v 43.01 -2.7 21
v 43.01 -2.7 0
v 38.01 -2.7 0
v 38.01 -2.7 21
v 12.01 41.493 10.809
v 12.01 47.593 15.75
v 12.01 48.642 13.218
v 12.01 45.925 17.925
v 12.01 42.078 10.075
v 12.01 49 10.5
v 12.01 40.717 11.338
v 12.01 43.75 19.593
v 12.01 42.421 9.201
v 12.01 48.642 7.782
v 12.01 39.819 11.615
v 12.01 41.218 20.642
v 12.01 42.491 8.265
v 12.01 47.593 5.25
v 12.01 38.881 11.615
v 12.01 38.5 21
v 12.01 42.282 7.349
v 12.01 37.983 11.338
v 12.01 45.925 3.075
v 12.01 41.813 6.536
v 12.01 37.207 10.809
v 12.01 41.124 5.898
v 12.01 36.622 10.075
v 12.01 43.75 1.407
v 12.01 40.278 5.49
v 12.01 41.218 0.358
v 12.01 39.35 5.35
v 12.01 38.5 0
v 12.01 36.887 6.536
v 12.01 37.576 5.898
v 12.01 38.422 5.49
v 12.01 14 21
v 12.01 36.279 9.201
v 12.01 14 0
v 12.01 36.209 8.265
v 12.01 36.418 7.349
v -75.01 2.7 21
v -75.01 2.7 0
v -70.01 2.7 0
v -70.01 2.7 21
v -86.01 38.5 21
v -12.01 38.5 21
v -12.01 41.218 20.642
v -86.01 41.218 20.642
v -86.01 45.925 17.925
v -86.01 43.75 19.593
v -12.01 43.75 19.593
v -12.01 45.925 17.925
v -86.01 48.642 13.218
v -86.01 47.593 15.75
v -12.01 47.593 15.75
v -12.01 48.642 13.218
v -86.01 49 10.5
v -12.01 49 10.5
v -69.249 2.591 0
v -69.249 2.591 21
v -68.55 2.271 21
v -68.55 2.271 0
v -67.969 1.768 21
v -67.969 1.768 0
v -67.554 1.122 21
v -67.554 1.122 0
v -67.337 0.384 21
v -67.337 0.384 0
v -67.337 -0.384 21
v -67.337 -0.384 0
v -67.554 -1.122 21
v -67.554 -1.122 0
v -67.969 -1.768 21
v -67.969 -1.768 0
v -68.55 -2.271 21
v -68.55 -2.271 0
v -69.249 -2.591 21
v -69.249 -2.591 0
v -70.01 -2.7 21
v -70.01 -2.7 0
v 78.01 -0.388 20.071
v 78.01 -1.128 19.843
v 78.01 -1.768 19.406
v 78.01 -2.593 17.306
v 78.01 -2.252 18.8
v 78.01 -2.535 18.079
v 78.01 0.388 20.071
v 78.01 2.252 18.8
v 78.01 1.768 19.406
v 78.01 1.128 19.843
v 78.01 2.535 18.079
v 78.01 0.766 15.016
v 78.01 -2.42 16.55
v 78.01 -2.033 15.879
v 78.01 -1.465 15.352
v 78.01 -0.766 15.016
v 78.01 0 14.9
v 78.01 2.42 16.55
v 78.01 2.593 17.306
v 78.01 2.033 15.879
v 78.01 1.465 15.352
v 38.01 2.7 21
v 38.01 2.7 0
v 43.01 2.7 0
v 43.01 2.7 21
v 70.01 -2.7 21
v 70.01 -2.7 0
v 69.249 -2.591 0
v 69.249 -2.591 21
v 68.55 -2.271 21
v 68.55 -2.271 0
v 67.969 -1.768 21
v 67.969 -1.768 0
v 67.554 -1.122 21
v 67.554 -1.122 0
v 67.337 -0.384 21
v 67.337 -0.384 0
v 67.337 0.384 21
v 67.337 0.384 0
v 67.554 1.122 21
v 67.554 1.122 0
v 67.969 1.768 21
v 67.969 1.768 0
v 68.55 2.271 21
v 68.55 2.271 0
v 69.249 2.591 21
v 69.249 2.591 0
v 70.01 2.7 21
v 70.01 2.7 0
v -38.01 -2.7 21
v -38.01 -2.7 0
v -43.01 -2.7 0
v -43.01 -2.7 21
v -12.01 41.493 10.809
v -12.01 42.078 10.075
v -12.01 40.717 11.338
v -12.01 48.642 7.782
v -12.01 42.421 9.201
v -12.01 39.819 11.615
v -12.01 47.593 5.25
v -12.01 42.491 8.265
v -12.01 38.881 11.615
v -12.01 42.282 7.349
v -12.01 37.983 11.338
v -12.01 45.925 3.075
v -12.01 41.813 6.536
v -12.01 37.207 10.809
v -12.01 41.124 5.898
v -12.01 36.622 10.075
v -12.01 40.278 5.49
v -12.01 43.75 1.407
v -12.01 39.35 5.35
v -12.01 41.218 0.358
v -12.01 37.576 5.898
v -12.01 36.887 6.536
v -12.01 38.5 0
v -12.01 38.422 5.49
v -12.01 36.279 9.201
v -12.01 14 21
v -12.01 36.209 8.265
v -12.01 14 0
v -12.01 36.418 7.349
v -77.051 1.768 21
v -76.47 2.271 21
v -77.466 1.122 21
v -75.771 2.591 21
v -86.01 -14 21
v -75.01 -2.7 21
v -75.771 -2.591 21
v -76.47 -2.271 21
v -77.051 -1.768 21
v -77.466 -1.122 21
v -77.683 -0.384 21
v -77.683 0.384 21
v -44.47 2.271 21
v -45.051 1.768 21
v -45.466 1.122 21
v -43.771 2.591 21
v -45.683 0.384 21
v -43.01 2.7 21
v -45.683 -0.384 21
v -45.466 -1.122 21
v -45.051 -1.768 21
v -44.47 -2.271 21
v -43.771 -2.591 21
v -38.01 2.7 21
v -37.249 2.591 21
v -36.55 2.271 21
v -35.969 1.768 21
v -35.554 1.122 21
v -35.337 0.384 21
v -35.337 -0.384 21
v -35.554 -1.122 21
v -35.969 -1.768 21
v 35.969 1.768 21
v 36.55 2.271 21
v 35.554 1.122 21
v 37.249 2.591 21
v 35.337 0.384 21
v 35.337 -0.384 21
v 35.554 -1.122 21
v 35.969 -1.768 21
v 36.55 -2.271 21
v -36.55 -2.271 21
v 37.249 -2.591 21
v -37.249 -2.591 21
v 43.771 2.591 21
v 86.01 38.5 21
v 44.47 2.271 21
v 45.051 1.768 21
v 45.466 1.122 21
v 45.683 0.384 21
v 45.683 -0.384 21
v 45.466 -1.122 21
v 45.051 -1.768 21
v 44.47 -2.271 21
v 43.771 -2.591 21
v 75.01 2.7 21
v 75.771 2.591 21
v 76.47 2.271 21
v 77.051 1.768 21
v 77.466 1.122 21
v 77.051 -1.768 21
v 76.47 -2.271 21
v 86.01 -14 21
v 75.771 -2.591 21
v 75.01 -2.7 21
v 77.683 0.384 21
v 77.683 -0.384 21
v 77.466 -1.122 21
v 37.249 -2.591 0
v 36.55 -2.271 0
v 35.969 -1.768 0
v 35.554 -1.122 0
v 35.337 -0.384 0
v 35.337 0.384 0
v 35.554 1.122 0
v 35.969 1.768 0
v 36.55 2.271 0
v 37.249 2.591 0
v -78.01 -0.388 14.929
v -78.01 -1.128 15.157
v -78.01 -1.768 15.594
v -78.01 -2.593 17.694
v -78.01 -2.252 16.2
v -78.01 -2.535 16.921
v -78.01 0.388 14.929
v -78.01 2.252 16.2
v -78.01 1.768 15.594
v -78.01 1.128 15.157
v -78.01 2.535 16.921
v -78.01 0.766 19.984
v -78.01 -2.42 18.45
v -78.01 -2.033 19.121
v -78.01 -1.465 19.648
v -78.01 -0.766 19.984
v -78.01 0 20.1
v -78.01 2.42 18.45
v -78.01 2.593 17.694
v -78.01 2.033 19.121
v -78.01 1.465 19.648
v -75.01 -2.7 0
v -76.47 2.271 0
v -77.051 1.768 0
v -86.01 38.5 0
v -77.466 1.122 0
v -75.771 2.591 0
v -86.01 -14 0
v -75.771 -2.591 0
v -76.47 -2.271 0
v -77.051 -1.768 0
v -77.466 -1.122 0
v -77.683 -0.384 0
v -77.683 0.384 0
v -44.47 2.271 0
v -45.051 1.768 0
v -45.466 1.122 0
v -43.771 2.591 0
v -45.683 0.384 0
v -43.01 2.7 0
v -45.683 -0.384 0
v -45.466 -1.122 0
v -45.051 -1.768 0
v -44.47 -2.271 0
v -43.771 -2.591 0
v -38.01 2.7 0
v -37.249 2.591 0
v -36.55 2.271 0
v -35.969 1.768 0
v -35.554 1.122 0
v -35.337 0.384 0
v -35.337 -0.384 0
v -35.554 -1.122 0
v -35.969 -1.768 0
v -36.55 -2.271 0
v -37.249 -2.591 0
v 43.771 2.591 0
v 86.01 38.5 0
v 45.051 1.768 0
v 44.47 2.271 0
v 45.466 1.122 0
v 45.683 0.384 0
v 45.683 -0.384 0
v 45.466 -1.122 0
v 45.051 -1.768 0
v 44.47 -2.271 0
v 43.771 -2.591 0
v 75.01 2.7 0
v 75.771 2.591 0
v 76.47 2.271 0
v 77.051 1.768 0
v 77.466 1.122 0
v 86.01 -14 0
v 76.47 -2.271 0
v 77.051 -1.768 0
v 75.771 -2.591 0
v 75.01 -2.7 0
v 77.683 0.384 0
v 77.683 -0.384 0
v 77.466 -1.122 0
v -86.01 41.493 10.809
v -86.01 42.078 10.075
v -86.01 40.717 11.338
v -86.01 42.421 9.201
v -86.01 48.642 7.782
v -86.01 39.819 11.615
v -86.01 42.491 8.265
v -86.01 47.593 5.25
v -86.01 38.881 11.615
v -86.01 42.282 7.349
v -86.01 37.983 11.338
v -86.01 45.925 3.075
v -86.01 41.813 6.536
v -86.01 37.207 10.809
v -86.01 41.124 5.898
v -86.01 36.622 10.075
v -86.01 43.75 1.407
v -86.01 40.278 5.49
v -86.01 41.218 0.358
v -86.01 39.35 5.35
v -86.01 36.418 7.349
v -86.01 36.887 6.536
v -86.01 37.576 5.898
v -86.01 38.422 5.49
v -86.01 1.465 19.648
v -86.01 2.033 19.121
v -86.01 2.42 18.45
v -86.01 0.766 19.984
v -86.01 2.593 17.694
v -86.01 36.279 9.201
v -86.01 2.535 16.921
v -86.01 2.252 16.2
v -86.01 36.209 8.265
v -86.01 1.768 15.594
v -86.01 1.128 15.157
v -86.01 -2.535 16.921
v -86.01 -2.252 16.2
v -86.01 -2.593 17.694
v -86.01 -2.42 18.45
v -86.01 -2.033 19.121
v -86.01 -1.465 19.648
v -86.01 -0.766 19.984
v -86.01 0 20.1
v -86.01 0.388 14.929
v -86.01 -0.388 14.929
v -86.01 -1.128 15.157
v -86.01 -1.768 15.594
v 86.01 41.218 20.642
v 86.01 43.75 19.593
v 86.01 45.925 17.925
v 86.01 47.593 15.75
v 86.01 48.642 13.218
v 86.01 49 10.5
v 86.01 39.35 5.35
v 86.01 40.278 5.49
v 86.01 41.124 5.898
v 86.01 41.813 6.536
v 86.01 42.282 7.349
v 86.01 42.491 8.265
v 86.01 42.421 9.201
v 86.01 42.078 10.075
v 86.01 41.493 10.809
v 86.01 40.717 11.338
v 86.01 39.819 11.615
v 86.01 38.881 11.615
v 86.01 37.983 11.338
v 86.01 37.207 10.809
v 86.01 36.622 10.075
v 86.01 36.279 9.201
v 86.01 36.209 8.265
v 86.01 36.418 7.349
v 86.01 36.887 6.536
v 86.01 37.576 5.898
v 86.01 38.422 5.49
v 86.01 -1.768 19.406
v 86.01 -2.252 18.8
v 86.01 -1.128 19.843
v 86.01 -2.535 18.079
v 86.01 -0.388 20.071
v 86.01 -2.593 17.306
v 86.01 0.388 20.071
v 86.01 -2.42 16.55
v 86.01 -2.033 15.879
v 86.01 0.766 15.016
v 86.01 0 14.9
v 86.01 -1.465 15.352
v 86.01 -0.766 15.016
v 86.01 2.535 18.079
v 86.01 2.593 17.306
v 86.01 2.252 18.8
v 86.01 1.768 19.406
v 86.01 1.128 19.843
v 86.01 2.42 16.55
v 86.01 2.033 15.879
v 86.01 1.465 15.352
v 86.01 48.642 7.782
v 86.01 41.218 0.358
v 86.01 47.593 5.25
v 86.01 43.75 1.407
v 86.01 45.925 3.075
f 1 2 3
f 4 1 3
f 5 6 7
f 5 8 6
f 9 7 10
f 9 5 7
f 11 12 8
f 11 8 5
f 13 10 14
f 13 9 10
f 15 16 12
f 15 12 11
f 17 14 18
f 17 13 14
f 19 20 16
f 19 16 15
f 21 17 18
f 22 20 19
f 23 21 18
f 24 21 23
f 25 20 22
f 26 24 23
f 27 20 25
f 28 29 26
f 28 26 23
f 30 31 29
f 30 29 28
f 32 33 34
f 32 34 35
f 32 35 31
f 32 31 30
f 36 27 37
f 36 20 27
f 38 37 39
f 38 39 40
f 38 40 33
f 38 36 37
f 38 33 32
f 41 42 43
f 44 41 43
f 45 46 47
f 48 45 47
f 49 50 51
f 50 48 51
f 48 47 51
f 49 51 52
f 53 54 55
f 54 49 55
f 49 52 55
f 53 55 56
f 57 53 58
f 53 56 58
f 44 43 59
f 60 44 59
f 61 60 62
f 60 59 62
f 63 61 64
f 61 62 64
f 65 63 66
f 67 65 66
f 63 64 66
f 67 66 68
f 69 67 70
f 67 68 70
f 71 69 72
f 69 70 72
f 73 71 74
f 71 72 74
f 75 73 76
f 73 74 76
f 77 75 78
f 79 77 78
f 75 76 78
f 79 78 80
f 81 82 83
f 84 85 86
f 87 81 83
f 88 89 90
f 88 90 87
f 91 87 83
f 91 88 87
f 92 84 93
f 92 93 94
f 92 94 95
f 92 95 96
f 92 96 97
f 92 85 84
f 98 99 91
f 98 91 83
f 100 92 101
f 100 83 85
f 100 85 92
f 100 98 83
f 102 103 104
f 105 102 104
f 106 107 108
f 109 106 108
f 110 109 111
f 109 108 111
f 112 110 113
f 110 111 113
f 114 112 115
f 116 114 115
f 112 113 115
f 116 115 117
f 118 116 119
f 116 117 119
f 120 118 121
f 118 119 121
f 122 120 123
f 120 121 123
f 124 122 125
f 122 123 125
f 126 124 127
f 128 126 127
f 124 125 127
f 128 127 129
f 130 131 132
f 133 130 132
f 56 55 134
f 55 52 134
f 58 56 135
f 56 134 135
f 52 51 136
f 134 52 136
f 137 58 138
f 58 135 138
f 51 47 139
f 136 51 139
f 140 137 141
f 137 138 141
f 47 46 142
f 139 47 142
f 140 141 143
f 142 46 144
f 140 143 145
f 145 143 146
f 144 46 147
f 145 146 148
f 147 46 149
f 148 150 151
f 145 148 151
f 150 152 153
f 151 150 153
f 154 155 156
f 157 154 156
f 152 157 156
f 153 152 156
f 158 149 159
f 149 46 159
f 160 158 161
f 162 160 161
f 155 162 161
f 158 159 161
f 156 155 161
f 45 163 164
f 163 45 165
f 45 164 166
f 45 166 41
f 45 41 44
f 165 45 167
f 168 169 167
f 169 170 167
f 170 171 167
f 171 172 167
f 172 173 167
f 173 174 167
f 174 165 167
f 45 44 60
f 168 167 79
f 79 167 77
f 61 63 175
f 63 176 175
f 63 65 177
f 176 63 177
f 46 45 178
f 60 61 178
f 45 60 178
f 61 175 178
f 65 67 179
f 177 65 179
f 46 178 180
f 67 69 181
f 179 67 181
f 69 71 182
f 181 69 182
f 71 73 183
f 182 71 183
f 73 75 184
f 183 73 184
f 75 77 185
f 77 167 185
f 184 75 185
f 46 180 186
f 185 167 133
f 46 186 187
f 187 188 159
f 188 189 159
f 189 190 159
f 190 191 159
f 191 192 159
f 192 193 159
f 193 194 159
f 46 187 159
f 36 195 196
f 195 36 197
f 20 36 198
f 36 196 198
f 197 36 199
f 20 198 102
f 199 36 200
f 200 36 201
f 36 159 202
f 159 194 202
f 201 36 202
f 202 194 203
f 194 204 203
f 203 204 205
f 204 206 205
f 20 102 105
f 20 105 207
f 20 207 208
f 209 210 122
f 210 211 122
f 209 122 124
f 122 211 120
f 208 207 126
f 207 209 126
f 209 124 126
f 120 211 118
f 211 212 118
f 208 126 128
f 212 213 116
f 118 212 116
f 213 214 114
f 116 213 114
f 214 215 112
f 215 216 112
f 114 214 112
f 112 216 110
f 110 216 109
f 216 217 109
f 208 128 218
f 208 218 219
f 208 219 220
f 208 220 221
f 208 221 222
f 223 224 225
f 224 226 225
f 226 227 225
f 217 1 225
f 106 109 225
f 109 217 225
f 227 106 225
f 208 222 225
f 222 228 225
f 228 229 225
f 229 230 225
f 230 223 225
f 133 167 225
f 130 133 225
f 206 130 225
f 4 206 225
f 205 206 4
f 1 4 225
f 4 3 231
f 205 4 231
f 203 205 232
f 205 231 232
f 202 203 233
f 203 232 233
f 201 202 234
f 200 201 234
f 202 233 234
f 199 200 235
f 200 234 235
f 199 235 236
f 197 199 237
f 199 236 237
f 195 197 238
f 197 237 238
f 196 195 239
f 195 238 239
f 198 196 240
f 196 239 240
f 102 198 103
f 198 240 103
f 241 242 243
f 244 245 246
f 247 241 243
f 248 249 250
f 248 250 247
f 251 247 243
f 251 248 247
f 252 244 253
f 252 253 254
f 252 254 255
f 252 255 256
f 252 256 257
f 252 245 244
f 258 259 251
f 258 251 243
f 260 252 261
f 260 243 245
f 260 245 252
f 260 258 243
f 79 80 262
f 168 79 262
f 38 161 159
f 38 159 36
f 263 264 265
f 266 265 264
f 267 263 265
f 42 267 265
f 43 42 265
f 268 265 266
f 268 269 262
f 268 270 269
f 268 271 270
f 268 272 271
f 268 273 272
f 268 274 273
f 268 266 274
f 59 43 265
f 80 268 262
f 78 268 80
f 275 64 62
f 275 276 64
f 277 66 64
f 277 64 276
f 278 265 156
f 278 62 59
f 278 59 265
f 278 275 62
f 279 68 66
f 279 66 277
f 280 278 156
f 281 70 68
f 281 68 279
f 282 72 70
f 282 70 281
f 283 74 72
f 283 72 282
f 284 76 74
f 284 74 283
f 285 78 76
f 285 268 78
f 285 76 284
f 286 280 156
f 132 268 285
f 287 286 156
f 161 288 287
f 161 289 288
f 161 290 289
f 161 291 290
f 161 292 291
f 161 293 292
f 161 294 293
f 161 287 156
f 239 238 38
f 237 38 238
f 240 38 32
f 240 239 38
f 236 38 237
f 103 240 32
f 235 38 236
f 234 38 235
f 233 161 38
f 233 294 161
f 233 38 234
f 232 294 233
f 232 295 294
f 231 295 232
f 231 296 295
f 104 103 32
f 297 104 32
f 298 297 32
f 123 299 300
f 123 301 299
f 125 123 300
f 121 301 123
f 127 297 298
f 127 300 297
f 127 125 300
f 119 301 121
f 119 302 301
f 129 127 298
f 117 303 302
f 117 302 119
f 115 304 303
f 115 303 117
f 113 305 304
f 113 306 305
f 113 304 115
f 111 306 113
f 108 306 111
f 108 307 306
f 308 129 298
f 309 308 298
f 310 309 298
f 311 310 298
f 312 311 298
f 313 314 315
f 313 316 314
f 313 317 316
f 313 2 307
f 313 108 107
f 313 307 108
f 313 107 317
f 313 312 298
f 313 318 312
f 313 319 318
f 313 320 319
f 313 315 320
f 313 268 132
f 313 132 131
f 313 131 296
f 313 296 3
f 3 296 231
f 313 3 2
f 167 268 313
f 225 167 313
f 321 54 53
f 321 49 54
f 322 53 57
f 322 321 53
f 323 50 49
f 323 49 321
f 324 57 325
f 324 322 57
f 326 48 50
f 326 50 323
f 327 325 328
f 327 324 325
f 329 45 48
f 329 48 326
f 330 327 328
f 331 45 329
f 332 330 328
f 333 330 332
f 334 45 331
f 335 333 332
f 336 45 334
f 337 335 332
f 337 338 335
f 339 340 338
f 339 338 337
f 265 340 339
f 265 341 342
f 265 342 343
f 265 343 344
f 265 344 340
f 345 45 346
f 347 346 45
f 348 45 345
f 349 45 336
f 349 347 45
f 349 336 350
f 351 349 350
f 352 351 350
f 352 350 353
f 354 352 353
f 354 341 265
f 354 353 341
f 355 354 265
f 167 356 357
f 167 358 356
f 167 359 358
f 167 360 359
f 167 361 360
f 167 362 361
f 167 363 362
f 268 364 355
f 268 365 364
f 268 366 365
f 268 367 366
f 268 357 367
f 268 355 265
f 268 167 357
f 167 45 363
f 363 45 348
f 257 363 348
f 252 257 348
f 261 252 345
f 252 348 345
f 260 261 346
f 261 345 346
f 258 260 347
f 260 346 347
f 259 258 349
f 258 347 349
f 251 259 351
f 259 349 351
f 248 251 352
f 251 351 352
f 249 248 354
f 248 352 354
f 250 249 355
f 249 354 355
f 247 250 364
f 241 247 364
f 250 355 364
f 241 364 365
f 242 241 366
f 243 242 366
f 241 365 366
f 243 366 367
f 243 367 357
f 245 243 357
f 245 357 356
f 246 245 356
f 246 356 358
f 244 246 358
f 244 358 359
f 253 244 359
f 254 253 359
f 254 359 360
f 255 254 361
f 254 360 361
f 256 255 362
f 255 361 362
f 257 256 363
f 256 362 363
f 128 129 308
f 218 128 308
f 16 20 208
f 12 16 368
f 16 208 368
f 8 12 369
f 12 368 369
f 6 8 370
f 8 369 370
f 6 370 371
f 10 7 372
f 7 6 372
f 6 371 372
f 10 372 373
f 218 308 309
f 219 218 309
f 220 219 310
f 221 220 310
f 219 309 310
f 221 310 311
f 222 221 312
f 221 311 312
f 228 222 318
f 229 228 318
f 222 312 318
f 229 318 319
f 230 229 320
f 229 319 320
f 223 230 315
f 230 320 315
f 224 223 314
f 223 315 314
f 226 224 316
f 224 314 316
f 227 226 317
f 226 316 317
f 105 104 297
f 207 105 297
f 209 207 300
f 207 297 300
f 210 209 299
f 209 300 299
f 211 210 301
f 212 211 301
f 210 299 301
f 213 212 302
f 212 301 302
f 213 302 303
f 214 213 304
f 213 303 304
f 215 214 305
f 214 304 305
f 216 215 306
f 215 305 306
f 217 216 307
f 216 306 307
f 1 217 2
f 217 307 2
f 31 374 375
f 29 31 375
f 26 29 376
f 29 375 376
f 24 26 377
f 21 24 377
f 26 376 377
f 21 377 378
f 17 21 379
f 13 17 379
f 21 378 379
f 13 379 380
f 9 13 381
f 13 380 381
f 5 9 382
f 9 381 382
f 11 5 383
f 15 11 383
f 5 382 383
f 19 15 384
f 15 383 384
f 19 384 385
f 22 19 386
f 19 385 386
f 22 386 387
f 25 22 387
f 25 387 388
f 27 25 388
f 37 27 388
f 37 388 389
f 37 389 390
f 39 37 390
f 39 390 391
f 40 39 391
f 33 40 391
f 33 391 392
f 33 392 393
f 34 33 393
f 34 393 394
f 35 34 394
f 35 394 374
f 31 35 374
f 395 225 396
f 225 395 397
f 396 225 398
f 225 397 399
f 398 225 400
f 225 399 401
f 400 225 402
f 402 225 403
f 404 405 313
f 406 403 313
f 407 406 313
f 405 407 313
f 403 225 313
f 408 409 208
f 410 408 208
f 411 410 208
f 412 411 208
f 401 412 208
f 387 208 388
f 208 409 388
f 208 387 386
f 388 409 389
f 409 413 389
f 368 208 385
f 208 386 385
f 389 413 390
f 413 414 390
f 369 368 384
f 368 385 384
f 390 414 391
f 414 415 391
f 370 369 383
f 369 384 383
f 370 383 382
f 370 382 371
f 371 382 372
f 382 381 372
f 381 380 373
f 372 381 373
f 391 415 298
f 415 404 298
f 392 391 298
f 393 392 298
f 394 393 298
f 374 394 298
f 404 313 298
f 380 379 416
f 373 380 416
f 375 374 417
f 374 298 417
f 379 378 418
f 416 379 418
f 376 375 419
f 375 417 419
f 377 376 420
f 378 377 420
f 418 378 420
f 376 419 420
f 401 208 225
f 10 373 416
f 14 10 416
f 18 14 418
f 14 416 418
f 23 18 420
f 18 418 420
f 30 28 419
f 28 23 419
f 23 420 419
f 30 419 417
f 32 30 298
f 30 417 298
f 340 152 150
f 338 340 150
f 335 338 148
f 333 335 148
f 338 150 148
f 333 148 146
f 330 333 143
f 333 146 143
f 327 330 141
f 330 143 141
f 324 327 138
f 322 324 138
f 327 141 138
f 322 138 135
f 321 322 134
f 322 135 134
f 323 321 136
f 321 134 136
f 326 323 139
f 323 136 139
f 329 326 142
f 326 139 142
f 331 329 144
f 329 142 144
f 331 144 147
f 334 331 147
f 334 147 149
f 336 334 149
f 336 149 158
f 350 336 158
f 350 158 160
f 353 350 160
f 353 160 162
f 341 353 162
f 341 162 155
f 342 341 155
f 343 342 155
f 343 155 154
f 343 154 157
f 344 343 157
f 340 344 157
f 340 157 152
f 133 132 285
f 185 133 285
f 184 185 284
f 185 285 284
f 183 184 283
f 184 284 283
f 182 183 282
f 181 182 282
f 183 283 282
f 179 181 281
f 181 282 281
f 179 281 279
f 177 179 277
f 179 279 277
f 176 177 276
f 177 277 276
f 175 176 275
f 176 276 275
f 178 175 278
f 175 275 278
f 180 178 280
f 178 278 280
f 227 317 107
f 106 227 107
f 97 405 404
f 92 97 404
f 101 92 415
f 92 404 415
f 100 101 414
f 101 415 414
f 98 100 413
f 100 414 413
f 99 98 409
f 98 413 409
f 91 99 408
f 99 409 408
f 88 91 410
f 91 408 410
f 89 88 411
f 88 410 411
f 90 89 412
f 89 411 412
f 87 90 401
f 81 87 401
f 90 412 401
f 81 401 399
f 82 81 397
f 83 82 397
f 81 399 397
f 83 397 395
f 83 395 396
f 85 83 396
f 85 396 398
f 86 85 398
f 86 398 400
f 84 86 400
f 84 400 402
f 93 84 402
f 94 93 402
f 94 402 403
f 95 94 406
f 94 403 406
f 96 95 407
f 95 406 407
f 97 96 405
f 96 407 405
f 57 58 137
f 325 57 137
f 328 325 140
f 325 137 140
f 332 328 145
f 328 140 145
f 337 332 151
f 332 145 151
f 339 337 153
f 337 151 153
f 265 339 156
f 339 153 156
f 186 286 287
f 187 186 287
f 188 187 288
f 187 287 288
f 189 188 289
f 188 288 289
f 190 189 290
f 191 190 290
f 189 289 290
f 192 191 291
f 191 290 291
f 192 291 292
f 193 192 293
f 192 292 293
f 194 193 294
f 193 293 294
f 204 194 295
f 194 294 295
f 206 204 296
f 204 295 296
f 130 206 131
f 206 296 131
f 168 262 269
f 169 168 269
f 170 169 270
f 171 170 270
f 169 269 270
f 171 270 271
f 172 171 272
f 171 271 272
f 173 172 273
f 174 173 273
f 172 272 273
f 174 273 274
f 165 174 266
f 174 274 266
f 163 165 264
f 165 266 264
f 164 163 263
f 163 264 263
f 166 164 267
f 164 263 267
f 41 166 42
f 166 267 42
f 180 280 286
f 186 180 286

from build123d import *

# Parameters (mm, degrees)
SKETCH_1_W          = 172.02
SKETCH_1_H          = 28
EXTRUDE_1_DEPTH     = 21
SKETCH_2_W          = 74
SKETCH_2_H          = 21
EXTRUDE_2_DEPTH     = 35
CUT_EXTRUDE_1_DEPTH = 173.02
SKETCH_4_R          = 3.15
CUT_EXTRUDE_2_DEPTH = 173.02
SKETCH_6_R          = 2.6
CUT_EXTRUDE_3_DEPTH = 8
SKETCH_7_R          = 2.6
CUT_EXTRUDE_4_DEPTH = 8


with BuildPart() as part:
    # 草图1 → 凸台-拉伸1 (new body)
    with BuildSketch(Plane.XY):
        Rectangle(SKETCH_1_W, SKETCH_1_H)
        with BuildLine():
            Line((75.01, -2.7), (70.01, -2.7))
            ThreePointArc((70.01, -2.7), (67.31, 0), (70.01, 2.7))
            Line((70.01, 2.7), (75.01, 2.7))
            ThreePointArc((75.01, 2.7), (77.71, 0), (75.01, -2.7))
        make_face(mode=Mode.SUBTRACT)
        with BuildLine():
            Line((43.01, -2.7), (38.01, -2.7))
            ThreePointArc((38.01, -2.7), (35.31, 0), (38.01, 2.7))
            Line((38.01, 2.7), (43.01, 2.7))
            ThreePointArc((43.01, 2.7), (45.71, 0), (43.01, -2.7))
        make_face(mode=Mode.SUBTRACT)
        with BuildLine():
            Line((-70.01, -2.7), (-75.01, -2.7))
            ThreePointArc((-75.01, -2.7), (-77.71, 0), (-75.01, 2.7))
            Line((-75.01, 2.7), (-70.01, 2.7))
            ThreePointArc((-70.01, 2.7), (-67.31, 0), (-70.01, -2.7))
        make_face(mode=Mode.SUBTRACT)
        with BuildLine():
            Line((-43.01, 2.7), (-38.01, 2.7))
            ThreePointArc((-38.01, 2.7), (-35.31, 0), (-38.01, -2.7))
            Line((-38.01, -2.7), (-43.01, -2.7))
            ThreePointArc((-43.01, -2.7), (-45.71, 0), (-43.01, 2.7))
        make_face(mode=Mode.SUBTRACT)
    extrude(amount=EXTRUDE_1_DEPTH)

    # 草图2 → 凸台-拉伸2 (add)
    with BuildSketch(Plane(origin=(0, 14, 0), x_dir=(1, 0, 0), z_dir=(0, 1, 0))):
        with Locations((-49.01, -10.5)):
            Rectangle(SKETCH_2_W, SKETCH_2_H)
        with Locations((49.01, -10.5)):
            Rectangle(SKETCH_2_W, SKETCH_2_H)
    extrude(amount=EXTRUDE_2_DEPTH)

    # 草图3 → 切除-拉伸1 (cut, through all)
    with BuildSketch(Plane(origin=(86.01, 0, 0), x_dir=(0, 0, -1), z_dir=(1, 0, 0))):
        with BuildLine():
            Line((0, 49), (-10.5, 49))
            ThreePointArc((-10.5, 49), (-3.075378798, 45.924621202), (0, 38.5))
            Line((0, 38.5), (0, 49))
        make_face()
        with BuildLine():
            Line((-10.5, 49), (-21, 49))
            Line((-21, 49), (-21, 38.5))
            ThreePointArc((-21, 38.5), (-17.924621202, 45.924621202), (-10.5, 49))
        make_face()
    extrude(amount=-CUT_EXTRUDE_1_DEPTH, mode=Mode.SUBTRACT)

    # 草图4 → 切除-拉伸2 (cut, through all)
    with BuildSketch(Plane(origin=(86.01, 0, 0), x_dir=(0, 0, -1), z_dir=(1, 0, 0))):
        with Locations((-8.500165561, 39.35)):
            Circle(SKETCH_4_R)
    extrude(amount=-CUT_EXTRUDE_2_DEPTH, mode=Mode.SUBTRACT)

    # 草图6 → 切除-拉伸3 (cut)
    with BuildSketch(Plane(origin=(86.01, 0, 0), x_dir=(0, 0, -1), z_dir=(1, 0, 0))):
        with Locations((-17.5, 0)):
            Circle(SKETCH_6_R)
    extrude(amount=-CUT_EXTRUDE_3_DEPTH, mode=Mode.SUBTRACT)

    # 草图7 → 切除-拉伸4 (cut)
    with BuildSketch(Plane.ZY.offset(86.01)):
        with Locations((17.5, 0)):
            Circle(SKETCH_7_R)
    extrude(amount=-CUT_EXTRUDE_4_DEPTH, mode=Mode.SUBTRACT)


solid = part.part
